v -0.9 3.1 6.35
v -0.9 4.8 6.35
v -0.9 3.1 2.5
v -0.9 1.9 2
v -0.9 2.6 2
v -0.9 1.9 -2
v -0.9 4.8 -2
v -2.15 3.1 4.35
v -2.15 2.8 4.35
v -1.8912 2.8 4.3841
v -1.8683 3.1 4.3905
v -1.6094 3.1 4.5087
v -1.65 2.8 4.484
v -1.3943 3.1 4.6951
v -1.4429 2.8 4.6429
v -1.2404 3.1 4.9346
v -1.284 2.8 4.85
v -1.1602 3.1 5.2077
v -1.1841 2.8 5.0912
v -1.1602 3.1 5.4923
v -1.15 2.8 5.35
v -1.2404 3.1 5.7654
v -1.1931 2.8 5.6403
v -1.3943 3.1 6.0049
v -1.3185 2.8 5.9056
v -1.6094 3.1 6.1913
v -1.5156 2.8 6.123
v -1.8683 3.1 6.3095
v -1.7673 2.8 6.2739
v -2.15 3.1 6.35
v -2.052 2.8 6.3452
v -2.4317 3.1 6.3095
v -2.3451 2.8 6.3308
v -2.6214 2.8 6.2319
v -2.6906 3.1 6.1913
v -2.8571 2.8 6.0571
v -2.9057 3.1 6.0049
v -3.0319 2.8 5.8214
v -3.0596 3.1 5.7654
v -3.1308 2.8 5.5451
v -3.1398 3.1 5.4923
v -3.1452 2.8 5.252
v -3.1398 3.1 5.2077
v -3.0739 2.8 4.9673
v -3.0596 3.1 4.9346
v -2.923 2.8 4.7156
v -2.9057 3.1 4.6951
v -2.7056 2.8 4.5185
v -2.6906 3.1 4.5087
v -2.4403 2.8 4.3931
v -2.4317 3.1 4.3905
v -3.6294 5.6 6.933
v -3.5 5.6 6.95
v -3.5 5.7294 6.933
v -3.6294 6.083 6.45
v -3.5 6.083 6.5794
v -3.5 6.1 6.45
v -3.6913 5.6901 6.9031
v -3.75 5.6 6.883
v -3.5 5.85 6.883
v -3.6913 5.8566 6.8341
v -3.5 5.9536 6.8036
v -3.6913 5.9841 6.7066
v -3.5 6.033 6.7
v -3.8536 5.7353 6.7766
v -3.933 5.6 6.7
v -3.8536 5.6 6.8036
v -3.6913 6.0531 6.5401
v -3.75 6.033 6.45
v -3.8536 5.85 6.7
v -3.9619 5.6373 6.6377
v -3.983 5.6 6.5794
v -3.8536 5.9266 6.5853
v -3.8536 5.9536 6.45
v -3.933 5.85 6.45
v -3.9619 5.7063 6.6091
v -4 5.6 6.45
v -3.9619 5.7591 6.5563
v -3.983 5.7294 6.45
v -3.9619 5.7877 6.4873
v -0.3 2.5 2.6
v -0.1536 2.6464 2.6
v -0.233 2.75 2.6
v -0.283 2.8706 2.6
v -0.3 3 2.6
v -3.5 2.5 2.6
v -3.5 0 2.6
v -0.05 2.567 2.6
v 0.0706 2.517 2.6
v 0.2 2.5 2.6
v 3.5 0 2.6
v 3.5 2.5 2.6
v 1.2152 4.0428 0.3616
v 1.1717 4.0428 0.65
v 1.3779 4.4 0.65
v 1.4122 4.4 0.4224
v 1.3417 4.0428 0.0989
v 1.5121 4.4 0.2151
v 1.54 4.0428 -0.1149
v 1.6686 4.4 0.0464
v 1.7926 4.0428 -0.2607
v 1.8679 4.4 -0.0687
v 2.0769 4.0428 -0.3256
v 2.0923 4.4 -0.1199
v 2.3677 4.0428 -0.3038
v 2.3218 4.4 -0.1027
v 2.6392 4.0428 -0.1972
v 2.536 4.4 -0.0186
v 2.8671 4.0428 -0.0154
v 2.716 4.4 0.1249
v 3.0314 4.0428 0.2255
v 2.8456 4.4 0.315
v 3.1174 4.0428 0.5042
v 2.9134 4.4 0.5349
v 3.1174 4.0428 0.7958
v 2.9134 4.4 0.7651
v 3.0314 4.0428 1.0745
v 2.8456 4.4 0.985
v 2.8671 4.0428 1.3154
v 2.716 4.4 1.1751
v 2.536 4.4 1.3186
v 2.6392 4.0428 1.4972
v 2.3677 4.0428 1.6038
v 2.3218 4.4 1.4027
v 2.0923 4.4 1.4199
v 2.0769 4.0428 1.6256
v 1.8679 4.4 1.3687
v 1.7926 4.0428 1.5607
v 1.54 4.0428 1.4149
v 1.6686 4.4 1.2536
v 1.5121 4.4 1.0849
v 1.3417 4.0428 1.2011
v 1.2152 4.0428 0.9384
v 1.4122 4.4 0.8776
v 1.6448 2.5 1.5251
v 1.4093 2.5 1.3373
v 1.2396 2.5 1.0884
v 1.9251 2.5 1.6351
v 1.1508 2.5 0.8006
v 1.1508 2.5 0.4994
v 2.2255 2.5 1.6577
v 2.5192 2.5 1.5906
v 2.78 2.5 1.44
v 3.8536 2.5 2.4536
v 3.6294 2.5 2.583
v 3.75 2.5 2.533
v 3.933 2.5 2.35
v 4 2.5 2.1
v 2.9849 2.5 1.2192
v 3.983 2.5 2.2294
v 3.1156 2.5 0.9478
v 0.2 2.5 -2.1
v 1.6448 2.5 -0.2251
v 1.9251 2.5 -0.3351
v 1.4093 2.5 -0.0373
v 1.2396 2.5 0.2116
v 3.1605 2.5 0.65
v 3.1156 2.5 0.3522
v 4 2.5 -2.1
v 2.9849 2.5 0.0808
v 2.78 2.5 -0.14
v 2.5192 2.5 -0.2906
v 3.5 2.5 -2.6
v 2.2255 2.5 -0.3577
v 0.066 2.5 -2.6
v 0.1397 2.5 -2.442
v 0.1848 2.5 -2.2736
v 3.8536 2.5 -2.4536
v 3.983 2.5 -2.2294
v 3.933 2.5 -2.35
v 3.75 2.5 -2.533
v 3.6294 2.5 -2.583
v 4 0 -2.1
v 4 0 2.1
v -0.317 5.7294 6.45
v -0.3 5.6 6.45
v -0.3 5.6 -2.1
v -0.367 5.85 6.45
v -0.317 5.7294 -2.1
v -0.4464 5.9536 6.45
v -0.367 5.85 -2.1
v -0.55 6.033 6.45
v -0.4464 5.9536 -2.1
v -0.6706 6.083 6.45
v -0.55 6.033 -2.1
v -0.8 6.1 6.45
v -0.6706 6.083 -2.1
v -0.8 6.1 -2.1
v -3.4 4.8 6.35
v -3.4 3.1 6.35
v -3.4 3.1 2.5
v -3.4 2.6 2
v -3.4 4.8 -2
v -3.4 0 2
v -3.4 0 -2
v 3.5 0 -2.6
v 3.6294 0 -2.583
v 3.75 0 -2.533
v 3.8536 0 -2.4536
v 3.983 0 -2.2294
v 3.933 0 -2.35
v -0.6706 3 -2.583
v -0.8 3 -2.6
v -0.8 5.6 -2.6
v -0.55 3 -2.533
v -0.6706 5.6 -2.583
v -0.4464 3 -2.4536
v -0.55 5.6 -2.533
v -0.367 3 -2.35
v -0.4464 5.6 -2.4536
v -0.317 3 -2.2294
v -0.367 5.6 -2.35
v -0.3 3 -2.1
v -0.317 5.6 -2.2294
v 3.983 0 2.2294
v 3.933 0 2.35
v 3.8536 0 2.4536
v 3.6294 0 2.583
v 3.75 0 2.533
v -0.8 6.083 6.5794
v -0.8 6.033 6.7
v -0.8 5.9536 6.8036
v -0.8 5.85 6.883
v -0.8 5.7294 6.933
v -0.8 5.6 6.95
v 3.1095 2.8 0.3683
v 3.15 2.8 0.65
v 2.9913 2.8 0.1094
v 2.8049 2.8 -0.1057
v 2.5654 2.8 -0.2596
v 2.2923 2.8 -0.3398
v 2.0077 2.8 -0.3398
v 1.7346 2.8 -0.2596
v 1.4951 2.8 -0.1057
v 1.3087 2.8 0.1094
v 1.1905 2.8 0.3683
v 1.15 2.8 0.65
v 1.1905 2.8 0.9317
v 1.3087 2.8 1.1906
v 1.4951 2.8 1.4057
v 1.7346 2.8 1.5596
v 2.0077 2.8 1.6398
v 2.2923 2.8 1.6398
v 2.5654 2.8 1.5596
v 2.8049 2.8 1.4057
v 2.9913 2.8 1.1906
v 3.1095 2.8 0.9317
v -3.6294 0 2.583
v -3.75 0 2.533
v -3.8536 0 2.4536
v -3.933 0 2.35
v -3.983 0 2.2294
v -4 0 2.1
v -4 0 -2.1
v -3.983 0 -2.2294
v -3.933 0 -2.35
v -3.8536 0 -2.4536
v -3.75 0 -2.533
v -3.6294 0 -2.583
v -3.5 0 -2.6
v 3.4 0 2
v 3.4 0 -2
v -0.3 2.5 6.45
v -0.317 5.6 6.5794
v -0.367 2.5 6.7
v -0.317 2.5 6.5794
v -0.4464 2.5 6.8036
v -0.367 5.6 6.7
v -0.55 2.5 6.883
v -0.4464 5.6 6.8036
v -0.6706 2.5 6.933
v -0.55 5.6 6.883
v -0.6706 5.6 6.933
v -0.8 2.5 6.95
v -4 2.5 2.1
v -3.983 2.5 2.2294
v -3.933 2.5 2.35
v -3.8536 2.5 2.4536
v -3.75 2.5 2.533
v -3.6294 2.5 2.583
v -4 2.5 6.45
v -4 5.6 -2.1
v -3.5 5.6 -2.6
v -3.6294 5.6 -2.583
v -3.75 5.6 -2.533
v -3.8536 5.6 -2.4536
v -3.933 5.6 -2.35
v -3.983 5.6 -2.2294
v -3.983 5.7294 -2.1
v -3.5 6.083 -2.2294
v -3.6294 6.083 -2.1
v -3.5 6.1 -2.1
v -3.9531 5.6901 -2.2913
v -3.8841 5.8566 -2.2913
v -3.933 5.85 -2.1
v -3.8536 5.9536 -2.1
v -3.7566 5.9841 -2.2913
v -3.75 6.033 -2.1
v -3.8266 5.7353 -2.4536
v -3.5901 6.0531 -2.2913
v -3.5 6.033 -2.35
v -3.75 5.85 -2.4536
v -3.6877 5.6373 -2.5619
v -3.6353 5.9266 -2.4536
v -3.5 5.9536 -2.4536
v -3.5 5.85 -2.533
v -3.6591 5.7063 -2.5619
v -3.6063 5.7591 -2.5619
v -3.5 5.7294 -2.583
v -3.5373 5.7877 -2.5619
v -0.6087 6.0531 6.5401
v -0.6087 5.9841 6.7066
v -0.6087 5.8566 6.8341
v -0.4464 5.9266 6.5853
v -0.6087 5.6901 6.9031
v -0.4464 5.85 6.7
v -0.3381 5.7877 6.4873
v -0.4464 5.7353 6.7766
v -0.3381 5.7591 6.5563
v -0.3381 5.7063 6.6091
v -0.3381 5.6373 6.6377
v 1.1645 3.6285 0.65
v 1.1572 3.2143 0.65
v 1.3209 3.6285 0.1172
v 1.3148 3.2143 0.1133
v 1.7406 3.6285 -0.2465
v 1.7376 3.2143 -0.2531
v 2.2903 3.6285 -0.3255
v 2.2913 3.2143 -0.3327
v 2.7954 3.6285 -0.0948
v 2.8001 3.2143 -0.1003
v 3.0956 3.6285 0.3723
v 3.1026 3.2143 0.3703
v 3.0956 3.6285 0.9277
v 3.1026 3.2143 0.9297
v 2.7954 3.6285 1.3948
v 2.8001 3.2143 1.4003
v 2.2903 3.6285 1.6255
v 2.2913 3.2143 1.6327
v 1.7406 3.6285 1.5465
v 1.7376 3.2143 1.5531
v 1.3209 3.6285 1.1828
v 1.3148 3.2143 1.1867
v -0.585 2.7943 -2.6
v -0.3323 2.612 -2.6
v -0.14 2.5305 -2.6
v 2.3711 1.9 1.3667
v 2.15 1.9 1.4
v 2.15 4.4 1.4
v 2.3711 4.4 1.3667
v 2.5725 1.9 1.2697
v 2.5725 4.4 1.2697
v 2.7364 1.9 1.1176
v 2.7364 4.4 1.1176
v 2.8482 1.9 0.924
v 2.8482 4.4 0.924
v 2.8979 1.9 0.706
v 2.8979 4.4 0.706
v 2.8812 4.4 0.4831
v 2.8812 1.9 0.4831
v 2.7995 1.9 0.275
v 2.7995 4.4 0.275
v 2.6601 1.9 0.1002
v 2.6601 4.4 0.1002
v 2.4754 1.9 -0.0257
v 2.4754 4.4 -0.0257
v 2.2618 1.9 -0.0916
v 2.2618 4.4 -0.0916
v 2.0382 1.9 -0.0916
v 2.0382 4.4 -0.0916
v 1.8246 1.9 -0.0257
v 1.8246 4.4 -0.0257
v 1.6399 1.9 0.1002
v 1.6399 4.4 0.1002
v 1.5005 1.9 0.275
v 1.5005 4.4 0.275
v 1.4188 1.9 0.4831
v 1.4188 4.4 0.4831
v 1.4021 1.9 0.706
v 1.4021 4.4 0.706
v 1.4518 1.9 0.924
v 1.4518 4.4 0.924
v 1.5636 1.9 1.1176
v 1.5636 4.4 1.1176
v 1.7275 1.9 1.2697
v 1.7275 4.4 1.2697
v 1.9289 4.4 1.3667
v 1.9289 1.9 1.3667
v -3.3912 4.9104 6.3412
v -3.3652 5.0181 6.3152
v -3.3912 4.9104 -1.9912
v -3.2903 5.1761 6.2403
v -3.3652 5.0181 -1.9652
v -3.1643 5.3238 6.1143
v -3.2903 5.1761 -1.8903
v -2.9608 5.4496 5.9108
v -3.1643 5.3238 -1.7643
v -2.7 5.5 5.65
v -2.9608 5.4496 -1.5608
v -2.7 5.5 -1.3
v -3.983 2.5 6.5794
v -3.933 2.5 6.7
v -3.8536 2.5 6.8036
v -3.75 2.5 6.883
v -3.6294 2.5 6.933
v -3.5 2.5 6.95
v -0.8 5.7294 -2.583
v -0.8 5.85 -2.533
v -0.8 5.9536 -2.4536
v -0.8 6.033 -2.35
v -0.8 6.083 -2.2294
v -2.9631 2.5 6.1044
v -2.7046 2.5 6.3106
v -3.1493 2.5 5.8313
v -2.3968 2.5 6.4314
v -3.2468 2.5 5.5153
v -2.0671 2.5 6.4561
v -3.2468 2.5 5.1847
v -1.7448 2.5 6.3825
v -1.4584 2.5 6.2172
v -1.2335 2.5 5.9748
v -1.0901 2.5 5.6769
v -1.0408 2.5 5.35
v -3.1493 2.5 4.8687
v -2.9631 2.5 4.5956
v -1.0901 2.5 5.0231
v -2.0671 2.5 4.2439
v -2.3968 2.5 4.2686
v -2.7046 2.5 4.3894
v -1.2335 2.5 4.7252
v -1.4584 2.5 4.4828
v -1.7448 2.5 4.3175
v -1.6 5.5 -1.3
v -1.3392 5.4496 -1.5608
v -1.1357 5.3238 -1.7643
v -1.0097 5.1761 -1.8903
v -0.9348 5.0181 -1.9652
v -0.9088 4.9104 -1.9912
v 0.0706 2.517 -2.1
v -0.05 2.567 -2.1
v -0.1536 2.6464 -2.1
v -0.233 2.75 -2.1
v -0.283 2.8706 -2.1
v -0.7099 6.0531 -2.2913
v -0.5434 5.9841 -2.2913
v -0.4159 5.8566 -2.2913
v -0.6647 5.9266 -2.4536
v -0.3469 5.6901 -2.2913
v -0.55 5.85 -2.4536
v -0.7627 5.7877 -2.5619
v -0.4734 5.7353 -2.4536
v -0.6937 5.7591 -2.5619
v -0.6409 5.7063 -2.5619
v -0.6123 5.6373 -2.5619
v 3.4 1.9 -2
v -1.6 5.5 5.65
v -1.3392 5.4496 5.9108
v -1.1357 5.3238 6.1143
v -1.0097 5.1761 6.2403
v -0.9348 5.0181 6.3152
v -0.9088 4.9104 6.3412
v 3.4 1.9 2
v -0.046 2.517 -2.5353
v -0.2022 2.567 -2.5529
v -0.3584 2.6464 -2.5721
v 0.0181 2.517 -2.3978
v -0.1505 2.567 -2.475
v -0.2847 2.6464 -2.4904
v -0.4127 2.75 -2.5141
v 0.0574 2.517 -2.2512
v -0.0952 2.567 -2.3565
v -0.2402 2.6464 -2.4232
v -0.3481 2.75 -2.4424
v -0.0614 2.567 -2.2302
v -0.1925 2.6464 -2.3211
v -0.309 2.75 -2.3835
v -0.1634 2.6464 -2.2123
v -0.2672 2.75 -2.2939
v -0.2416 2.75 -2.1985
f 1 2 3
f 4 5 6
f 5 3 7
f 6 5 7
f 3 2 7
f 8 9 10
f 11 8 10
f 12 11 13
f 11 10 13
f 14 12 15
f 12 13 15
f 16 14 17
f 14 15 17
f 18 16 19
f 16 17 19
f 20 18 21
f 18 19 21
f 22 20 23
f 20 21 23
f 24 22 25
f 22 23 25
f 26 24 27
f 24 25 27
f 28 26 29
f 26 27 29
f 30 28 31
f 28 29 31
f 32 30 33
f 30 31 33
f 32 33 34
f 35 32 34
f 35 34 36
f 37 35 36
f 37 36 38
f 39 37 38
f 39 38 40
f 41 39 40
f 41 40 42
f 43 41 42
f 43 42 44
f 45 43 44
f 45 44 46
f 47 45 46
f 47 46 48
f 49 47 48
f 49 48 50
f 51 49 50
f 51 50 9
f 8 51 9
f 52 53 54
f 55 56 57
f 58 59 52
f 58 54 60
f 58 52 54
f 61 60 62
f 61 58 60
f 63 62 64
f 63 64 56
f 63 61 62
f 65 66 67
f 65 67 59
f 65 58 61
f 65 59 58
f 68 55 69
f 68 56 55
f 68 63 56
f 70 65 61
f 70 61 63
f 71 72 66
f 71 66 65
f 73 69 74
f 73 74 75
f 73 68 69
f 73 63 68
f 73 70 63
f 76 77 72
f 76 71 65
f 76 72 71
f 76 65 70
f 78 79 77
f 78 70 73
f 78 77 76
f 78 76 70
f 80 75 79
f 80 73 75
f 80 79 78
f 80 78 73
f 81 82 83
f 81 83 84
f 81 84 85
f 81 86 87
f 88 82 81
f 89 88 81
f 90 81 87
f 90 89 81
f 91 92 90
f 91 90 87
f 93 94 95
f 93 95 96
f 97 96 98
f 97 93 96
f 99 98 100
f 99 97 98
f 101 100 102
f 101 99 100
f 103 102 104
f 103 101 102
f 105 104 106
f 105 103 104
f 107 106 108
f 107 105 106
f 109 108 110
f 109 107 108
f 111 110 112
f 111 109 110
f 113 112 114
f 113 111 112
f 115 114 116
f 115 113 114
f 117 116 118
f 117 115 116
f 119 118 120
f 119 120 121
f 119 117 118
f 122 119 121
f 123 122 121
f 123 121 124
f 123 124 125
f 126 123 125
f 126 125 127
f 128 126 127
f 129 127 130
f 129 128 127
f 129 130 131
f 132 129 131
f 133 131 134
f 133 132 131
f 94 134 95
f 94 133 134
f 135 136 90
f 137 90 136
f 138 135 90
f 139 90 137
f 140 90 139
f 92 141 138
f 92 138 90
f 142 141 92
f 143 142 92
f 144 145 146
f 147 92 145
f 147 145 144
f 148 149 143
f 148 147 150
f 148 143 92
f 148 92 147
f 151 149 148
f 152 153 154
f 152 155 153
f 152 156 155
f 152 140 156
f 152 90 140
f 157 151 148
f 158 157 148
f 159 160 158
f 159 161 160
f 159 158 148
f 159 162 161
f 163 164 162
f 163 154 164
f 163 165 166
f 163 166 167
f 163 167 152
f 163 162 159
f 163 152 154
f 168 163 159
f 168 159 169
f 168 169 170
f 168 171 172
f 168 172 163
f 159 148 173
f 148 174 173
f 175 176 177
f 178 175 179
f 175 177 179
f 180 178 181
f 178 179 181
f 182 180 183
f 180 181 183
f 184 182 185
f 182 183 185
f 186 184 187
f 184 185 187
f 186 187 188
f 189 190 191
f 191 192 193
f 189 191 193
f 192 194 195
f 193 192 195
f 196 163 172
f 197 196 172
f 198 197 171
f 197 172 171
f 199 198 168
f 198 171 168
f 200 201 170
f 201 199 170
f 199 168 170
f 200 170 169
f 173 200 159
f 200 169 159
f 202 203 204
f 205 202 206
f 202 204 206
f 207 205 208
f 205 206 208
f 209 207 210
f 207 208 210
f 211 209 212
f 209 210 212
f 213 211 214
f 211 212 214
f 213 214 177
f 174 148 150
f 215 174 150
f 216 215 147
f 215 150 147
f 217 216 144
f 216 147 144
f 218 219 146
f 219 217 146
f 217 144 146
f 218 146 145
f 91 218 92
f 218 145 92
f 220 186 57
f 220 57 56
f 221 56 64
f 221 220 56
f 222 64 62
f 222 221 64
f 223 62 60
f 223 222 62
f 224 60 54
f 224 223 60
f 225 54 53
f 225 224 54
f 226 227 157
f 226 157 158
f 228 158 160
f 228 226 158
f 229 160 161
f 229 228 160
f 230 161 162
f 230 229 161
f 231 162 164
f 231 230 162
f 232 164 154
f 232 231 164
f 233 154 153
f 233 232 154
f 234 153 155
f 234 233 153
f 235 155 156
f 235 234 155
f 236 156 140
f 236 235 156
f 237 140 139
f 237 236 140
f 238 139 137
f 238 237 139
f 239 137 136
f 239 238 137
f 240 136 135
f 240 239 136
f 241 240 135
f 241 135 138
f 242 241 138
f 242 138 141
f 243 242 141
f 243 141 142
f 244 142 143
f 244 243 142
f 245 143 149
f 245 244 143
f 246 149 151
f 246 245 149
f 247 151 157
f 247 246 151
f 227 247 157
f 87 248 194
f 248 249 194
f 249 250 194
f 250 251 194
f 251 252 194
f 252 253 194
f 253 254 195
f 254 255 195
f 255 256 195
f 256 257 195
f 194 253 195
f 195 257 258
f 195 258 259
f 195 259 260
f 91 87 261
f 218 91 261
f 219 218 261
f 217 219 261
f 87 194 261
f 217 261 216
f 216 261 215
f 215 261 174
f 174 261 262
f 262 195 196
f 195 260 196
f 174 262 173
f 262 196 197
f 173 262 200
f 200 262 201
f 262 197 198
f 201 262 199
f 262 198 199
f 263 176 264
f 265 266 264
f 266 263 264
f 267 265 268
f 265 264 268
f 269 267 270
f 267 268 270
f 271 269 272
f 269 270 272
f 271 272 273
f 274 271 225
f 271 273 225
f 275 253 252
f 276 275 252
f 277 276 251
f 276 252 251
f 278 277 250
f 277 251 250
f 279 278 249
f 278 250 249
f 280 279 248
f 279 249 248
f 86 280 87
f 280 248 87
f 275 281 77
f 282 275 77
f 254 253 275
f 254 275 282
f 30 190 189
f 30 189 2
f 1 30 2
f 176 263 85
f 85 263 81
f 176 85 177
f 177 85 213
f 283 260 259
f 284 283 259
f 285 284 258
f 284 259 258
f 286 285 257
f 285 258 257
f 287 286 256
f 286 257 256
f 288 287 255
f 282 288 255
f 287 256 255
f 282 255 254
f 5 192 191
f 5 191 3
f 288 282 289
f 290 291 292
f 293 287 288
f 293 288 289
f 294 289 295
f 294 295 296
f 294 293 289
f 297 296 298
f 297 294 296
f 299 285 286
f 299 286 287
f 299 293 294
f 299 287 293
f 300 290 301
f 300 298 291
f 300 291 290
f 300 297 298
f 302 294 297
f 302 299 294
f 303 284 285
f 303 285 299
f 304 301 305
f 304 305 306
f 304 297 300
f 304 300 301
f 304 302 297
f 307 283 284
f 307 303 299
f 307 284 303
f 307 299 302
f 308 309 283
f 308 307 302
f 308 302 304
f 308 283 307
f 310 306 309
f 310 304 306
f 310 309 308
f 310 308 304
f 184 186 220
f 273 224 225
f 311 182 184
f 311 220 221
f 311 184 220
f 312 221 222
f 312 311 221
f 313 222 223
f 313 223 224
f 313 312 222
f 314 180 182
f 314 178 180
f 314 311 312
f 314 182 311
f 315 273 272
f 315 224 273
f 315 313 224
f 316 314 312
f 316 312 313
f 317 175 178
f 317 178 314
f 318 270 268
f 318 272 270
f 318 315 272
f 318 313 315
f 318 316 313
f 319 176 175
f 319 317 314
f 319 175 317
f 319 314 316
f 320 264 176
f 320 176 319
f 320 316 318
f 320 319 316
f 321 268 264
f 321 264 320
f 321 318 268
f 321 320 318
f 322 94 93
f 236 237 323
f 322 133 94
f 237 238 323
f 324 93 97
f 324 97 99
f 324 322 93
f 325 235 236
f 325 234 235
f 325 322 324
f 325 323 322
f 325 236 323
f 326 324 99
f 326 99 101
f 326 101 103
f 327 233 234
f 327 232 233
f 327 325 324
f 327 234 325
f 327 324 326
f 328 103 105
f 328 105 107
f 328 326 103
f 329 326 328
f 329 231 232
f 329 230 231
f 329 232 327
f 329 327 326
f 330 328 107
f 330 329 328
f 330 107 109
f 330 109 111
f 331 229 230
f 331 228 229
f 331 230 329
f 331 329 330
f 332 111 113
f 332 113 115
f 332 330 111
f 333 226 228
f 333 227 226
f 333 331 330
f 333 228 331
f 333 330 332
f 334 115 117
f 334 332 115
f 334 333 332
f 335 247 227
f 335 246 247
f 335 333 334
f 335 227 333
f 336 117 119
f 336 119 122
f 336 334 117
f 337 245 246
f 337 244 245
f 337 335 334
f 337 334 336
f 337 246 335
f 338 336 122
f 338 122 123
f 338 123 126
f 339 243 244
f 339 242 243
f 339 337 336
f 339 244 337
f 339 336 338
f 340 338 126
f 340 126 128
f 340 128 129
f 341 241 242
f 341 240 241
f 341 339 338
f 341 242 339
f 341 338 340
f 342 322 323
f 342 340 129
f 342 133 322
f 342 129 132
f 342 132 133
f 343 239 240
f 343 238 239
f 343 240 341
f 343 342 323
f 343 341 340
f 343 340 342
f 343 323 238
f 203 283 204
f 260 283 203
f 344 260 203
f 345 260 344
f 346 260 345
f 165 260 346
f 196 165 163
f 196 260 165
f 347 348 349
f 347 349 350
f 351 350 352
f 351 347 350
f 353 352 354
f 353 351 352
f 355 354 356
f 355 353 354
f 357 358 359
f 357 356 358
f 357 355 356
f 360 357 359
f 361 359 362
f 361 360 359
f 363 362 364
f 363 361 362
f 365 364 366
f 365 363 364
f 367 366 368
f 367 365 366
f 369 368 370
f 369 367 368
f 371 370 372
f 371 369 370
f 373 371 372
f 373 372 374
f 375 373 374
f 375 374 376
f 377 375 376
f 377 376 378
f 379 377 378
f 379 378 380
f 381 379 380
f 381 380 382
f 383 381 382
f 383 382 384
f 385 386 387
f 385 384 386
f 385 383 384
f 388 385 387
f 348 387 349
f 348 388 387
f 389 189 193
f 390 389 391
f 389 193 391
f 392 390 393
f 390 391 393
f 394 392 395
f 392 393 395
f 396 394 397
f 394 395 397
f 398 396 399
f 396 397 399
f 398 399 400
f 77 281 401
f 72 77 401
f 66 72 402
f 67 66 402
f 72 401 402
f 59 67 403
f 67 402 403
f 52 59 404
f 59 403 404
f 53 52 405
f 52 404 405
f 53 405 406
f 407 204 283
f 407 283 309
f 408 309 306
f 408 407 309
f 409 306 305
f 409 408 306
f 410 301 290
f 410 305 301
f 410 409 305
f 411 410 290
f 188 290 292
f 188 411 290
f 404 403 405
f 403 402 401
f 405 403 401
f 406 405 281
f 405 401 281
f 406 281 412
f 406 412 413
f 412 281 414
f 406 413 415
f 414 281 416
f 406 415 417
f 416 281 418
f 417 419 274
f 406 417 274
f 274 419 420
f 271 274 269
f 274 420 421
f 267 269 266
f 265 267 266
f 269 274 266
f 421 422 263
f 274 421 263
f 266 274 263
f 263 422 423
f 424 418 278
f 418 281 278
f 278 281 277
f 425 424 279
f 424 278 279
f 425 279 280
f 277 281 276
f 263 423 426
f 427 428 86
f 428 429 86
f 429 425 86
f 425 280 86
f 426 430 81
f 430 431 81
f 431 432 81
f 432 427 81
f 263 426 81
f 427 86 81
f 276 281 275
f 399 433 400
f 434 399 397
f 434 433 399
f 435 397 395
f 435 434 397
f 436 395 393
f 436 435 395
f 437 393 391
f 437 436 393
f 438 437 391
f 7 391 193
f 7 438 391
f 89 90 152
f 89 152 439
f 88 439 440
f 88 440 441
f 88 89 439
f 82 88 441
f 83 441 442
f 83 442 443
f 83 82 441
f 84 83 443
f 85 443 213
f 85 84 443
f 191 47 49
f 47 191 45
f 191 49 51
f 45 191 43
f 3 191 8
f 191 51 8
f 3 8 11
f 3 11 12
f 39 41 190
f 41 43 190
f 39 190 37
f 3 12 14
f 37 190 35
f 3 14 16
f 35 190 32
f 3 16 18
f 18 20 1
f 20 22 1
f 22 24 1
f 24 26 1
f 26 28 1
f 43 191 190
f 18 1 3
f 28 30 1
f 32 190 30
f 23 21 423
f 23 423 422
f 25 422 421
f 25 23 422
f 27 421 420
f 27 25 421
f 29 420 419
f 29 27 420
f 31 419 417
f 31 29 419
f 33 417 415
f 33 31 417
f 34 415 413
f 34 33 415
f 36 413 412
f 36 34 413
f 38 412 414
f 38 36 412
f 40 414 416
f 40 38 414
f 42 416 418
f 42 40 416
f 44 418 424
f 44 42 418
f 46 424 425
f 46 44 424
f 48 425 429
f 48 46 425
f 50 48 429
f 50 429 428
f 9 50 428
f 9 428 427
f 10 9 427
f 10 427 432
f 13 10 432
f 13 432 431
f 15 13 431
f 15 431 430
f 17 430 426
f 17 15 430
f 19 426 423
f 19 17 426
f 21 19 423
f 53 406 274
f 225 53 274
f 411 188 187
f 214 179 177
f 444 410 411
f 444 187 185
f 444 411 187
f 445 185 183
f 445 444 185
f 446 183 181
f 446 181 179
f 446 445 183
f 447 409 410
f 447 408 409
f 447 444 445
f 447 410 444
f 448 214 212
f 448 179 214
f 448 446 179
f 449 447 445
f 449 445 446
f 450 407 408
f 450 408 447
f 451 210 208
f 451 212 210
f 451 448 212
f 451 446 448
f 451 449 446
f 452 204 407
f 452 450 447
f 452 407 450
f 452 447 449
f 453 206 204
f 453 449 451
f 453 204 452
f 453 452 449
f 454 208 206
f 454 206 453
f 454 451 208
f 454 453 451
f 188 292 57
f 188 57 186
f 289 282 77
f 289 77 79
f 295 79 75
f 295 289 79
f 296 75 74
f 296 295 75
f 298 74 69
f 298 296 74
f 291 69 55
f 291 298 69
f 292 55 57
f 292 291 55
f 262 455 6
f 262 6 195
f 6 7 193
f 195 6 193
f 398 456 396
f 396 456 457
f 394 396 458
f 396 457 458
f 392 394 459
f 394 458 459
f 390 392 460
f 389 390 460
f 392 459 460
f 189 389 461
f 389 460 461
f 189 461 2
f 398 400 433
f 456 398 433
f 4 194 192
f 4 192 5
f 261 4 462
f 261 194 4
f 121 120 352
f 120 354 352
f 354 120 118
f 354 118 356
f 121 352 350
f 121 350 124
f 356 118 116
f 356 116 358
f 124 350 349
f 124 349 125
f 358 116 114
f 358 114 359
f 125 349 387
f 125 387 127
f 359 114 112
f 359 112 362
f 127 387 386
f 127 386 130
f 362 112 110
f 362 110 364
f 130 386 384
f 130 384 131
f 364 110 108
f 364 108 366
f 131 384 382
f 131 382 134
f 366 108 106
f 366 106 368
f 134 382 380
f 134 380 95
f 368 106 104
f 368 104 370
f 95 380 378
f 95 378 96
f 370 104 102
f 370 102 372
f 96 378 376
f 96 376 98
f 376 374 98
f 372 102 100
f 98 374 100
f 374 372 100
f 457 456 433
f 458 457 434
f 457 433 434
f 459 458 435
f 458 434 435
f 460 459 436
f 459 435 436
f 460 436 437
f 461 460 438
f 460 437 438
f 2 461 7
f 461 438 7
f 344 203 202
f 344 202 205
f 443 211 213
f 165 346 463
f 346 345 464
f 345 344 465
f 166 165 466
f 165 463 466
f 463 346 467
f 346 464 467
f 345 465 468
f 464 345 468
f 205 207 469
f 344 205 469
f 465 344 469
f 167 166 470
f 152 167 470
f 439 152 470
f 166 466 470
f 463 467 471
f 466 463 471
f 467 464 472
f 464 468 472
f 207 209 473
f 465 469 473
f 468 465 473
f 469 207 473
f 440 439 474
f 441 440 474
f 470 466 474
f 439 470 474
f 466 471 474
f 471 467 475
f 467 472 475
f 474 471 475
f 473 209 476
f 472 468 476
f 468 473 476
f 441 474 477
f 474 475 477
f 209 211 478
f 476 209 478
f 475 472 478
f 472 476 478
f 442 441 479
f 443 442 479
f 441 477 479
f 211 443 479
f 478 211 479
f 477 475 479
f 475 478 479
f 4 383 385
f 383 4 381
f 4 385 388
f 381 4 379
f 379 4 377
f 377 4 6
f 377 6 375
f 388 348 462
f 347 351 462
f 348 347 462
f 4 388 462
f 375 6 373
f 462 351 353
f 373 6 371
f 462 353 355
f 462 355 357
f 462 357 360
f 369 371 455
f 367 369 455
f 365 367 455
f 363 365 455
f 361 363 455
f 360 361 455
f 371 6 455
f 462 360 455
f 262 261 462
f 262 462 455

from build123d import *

# Parameters (mm, degrees)
SKETCH1_W               = 8
SKETCH1_H               = 5.2
SKETCH1_W_2             = 6.8
SKETCH1_H_2             = 4
BOSS_EXTRUDE1_DEPTH     = 2.5
SKETCH3_W               = 3.7
SKETCH3_H               = 9.55
SKETCH3_W_2             = 2.5
SKETCH3_H_2             = 8.35
BOSS_EXTRUDE2_DEPTH     = 3
SKETCH4_W               = 3.7
SKETCH4_H               = 4.95
BOSS_EXTRUDE3_DEPTH     = 0.6
SKETCH5_W               = 3.7
SKETCH5_H               = 9.55
BOSS_EXTRUDE4_DEPTH     = 0.6
SKETCH6_W               = 4.9
SKETCH6_H               = 5.2
BOSS_EXTRUDE5_DEPTH     = 0.6
FILLET2_R               = 0.7
SKETCH7_R               = 1
CUT_EXTRUDE1_DEPTH      = 4.5
CUT_EXTRUDE1_DRAFT      = -20
CUT_EXTRUDE3_REACH      = 10.671
SKETCH7_2_R             = 1
BOSS_EXTRUDE6_START     = -0.3
SKETCH8_R               = 1
BOSS_EXTRUDE6_DEPTH     = 1.6
BOSS_EXTRUDE6_DRAFT     = -1
CUT_EXTRUDE2_DEPTH      = 10.146720724
CUT_EXTRUDE2_DEPTH_BACK = 10.146720724
SKETCH9_R               = 0.75
FILLET3_R               = 0.5
FILLET5_R               = 0.5
FILLET6_R               = 0.5
CHAMFER1_SIZE           = 0.5
CHAMFER2_SIZE           = 0.2
CHAMFER2_SIZE2          = 0.357264117


# Read off the part's stored shape, not the designer's step: Boss-Extrude7
with BuildPart() as part:
    # Sketch1 → Boss-Extrude1 (new body)
    with BuildSketch(Plane(origin=(0, 0, 0), x_dir=(1, 0, 0), z_dir=(0, 1, 0))):
        Rectangle(SKETCH1_W, SKETCH1_H)
        Rectangle(SKETCH1_W_2, SKETCH1_H_2, mode=Mode.SUBTRACT)
    extrude(amount=BOSS_EXTRUDE1_DEPTH)

    # Sketch3 → Boss-Extrude2 (add)
    with BuildSketch(Plane(origin=(0, 2.5, 0), x_dir=(1, 0, 0), z_dir=(0, 1, 0))):
        with Locations((-2.15, -2.175)):
            Rectangle(SKETCH3_W, SKETCH3_H)
        with Locations((-2.15, -2.175)):
            Rectangle(SKETCH3_W_2, SKETCH3_H_2, mode=Mode.SUBTRACT)
    extrude(amount=BOSS_EXTRUDE2_DEPTH)

    # Sketch4 → Boss-Extrude3 (add)
    with BuildSketch(Plane.XZ.offset(-2.5)):
        with Locations((-2.15, 4.475)):
            Rectangle(SKETCH4_W, SKETCH4_H)
    extrude(amount=-BOSS_EXTRUDE3_DEPTH)

    # Sketch5 → Boss-Extrude4 (add)
    with BuildSketch(Plane(origin=(0, 5.5, 0), x_dir=(1, 0, 0), z_dir=(0, 1, 0))):
        with Locations((-2.15, -2.175)):
            Rectangle(SKETCH5_W, SKETCH5_H)
    extrude(amount=BOSS_EXTRUDE4_DEPTH)

    # Sketch6 → Boss-Extrude5 (add)
    with BuildSketch(Plane(origin=(0, 2.5, 0), x_dir=(1, 0, 0), z_dir=(0, 1, 0))):
        with Locations((1.55, 0)):
            Rectangle(SKETCH6_W, SKETCH6_H)
    extrude(amount=-BOSS_EXTRUDE5_DEPTH)

    # Fillet2
    fillet2_edges = [part.edges().sort_by_distance(p)[0] for p in [
        (-2.15, 5.5, -2),
        (-0.9, 5.5, 2.175),
        (-2.15, 5.5, 6.35),
        (-3.4, 5.5, 2.175),
    ]]
    fillet(fillet2_edges, radius=FILLET2_R)


with BuildPart() as cut_extrude1_tool:
    # Sketch7 → Cut-Extrude1 (with draft: the straight prism first)
    with BuildSketch(Plane.XZ.offset(-2.8)):
        with Locations((-2.15, 5.35)):
            Circle(SKETCH7_R)
    extrude(amount=CUT_EXTRUDE1_DEPTH)
    # Cut-Extrude1: the draft: its side faces are tilted about the plane it starts from
    cut_extrude1_sides = [cut_extrude1_tool.faces().sort_by_distance(p)[0] for p in [
        (-3.15, 0.55, 5.35),
    ]]
    draft(cut_extrude1_sides, Plane.XZ.offset(-2.8), CUT_EXTRUDE1_DRAFT)


with BuildPart() as part_1:
    add(part.part)

    # Cut-Extrude1: cut by cut_extrude1_tool
    add(cut_extrude1_tool.part, mode=Mode.SUBTRACT)

    # Sketch7<2> → Cut-Extrude3 (cut, up to next)
    with BuildSketch(Plane.XZ.offset(-2.8), mode=Mode.PRIVATE) as cut_extrude3_sk1:
        with Locations(Location((-2.15, 5.35, 0), (0, 0, 270))):
            Circle(SKETCH7_2_R)
    cut_extrude3_tool1 = extrude(cut_extrude3_sk1.sketch, amount=-CUT_EXTRUDE3_REACH, mode=Mode.PRIVATE) & part_1.part
    add(cut_extrude3_tool1.solids().sort_by_distance((-2.15, 2.8, 5.35))[0], mode=Mode.SUBTRACT)



with BuildPart() as body_2:
    # Sketch8 → Boss-Extrude6 (with draft: the straight prism first)
    with BuildSketch(Plane(origin=(0, 2.5, 0), x_dir=(-1, 0, 0), z_dir=(0, -1, 0)).offset(BOSS_EXTRUDE6_START)):
        with Locations((-2.15, -0.65)):
            Circle(SKETCH8_R)
    extrude(amount=-BOSS_EXTRUDE6_DEPTH)
    # Boss-Extrude6: the draft: its side faces are tilted about the plane it starts from
    boss_extrude6_sides = [body_2.faces().sort_by_distance(p)[0] for p in [
        (3.15, 3.6, 0.65),
    ]]
    draft(boss_extrude6_sides, Plane(origin=(0, 2.5, 0), x_dir=(-1, 0, 0), z_dir=(0, -1, 0)).offset(BOSS_EXTRUDE6_START), BOSS_EXTRUDE6_DRAFT)


with BuildPart() as part_2:
    add(part_1.part)

    add(body_2.part)  # Boss-Extrude7 merges body 2
    # Boss-Extrude7 outline → Boss-Extrude7 (revolve)
    with BuildSketch(Plane(origin=(2.15, 0, 0.65), x_dir=(1, 0, 0), z_dir=(0, 0, 1))):
        Polygon((1.010476231, 2.5), (1, 2.8), (0, 2.8), (0, 2.5), align=None)
    revolve(axis=Axis((2.15, 0, 0.65), (0, 1, 0)))

    # Sketch9 → Cut-Extrude2 (cut, two sides: drawn at the far end of the back side and taken through both)
    with BuildSketch(Plane(origin=(0, 4.4, 0), x_dir=(1, 0, 0), z_dir=(0, 1, 0)).offset(-CUT_EXTRUDE2_DEPTH_BACK)):
        with Locations(Location((2.15, -0.65, 0), (0, 0, 270))):
            Circle(SKETCH9_R)
    extrude(amount=CUT_EXTRUDE2_DEPTH + CUT_EXTRUDE2_DEPTH_BACK, mode=Mode.SUBTRACT)

    # Fillet3
    fillet3_edges = [part_2.edges().sort_by_distance(p)[0] for p in [
        (-4, 6.1, 2.175),
        (-2.15, 6.1, 6.95),
        (-0.3, 6.1, 2.175),
        (-2.15, 6.1, -2.6),
    ]]
    fillet(fillet3_edges, radius=FILLET3_R)

    # Fillet5
    # the kernel refuses this fillet: 0.5 mm, written as the material it takes off along each edge
    with BuildSketch(Plane(origin=(-0.8, 5.6, -2.1), x_dir=(1, 0, 0), z_dir=(0, 0, -1))) as fillet5_piece_1_section:
        Polygon((0, 0), (FILLET5_R, 0), (FILLET5_R, -FILLET5_R), (0, -FILLET5_R), align=None)
    fillet5_piece_1 = extrude(amount=FILLET5_R, mode=Mode.PRIVATE)
    fillet5_piece_1 = fillet5_piece_1 - Plane(origin=(-0.8, 5.6, -2.1), x_dir=(-0.7071067811865475, -0.7071067811865475, 0), z_dir=(0, 0, -1)) * Sphere(FILLET5_R, mode=Mode.PRIVATE)
    add(fillet5_piece_1, mode=Mode.SUBTRACT)
    with BuildSketch(Plane(origin=(-0.8, 5.6, 6.45), x_dir=(0, 0, 1), z_dir=(1, 0, 0))) as fillet5_piece_2_section:
        Polygon((0, 0), (FILLET5_R, 0), (FILLET5_R, -FILLET5_R), (0, -FILLET5_R), align=None)
    fillet5_piece_2 = extrude(amount=FILLET5_R, mode=Mode.PRIVATE)
    fillet5_piece_2 = fillet5_piece_2 - Plane(origin=(-0.8, 5.6, 6.45), x_dir=(0, -0.7071067811865475, -0.7071067811865475), z_dir=(1, 0, 0)) * Sphere(FILLET5_R, mode=Mode.PRIVATE)
    add(fillet5_piece_2, mode=Mode.SUBTRACT)
    with BuildSketch(Plane(origin=(-3.5, 5.6, -2.1), x_dir=(-1, 0, 0), z_dir=(0, 0, -1))) as fillet5_piece_3_section:
        Polygon((0, 0), (FILLET5_R, 0), (FILLET5_R, FILLET5_R), (0, FILLET5_R), align=None)
    fillet5_piece_3 = extrude(amount=FILLET5_R, mode=Mode.PRIVATE)
    fillet5_piece_3 = fillet5_piece_3 - Plane(origin=(-3.5, 5.6, -2.1), x_dir=(0.7071067811865475, -0.7071067811865475, 0), z_dir=(0, 0, -1)) * Sphere(FILLET5_R, mode=Mode.PRIVATE)
    add(fillet5_piece_3, mode=Mode.SUBTRACT)
    with BuildSketch(Plane(origin=(-3.5, 5.6, 6.45), x_dir=(0, 0, 1), z_dir=(-1, 0, 0))) as fillet5_piece_4_section:
        Polygon((0, 0), (FILLET5_R, 0), (FILLET5_R, FILLET5_R), (0, FILLET5_R), align=None)
    fillet5_piece_4 = extrude(amount=FILLET5_R, mode=Mode.PRIVATE)
    fillet5_piece_4 = fillet5_piece_4 - Plane(origin=(-3.5, 5.6, 6.45), x_dir=(0, -0.7071067811865475, -0.7071067811865475), z_dir=(-1, 0, 0)) * Sphere(FILLET5_R, mode=Mode.PRIVATE)
    add(fillet5_piece_4, mode=Mode.SUBTRACT)
    with BuildSketch(Plane(origin=(4, 3.75, 2.6), x_dir=(0, 0, -1), z_dir=(0, -1, 0)), Plane(origin=(4, 3.75, -2.6), x_dir=(-1, 0, 0), z_dir=(0, -1, 0))) as fillet5_piece_5:
        with BuildLine():
            CenterArc((FILLET5_R, -FILLET5_R), FILLET5_R, 90, 90)
            Line((0, -FILLET5_R), (0, 0))
            Line((0, 0), (FILLET5_R, 0))
        make_face()
    extrude(amount=5, mode=Mode.SUBTRACT)
    with BuildSketch(Plane(origin=(-4, 1.25, 6.95), x_dir=(0, 0, -1), z_dir=(0, 1, 0)), Plane(origin=(-0.3, 5.6, 6.95), x_dir=(0, 0, -1), z_dir=(0, -1, 0))) as fillet5_piece_6:
        with BuildLine():
            CenterArc((FILLET5_R, -FILLET5_R), FILLET5_R, 90, 90)
            Line((0, -FILLET5_R), (0, 0))
            Line((0, 0), (FILLET5_R, 0))
        make_face()
    extrude(amount=4.35, mode=Mode.SUBTRACT)
    with BuildSketch(Plane(origin=(-4, -1.25, -2.6), x_dir=(1, 0, 0), z_dir=(0, 1, 0))) as fillet5_piece_7:
        with BuildLine():
            CenterArc((FILLET5_R, -FILLET5_R), FILLET5_R, 90, 90)
            Line((0, -FILLET5_R), (0, 0))
            Line((0, 0), (FILLET5_R, 0))
        make_face()
    extrude(amount=6.85, mode=Mode.SUBTRACT)
    with BuildSketch(Plane(origin=(-0.3, 5.6, -2.6), x_dir=(-1, 0, 0), z_dir=(0, -1, 0))) as fillet5_piece_8:
        with BuildLine():
            CenterArc((FILLET5_R, -FILLET5_R), FILLET5_R, 90, 90)
            Line((0, -FILLET5_R), (0, 0))
            Line((0, 0), (FILLET5_R, 0))
        make_face()
    extrude(amount=3.1, mode=Mode.SUBTRACT)
    with BuildSketch(Plane(origin=(-4, -1.25, 2.6), x_dir=(0, 0, -1), z_dir=(0, 1, 0))) as fillet5_piece_9:
        with BuildLine():
            CenterArc((FILLET5_R, -FILLET5_R), FILLET5_R, 90, 90)
            Line((0, -FILLET5_R), (0, 0))
            Line((0, 0), (FILLET5_R, 0))
        make_face()
    extrude(amount=3.75, mode=Mode.SUBTRACT)

    # Fillet6
    # the kernel refuses this fillet: 0.5 mm, written as the material it adds along each edge
    with BuildSketch(Plane(origin=(-0.3, 2.5, 2.6), x_dir=(0, 1, 0), z_dir=(0, 0, -1))) as fillet6_piece_1:
        with BuildLine():
            CenterArc((FILLET6_R, FILLET6_R), FILLET6_R, 180, 90)
            Line((0, FILLET6_R), (0, 0))
            Line((0, 0), (FILLET6_R, 0))
        make_face()
    extrude(amount=4.7)
    with BuildSketch(Plane(origin=(-0.8, 2.5, -2.1), x_dir=(-0.5976672776328278, 0, 0.8017442392976482), z_dir=(0.8017442392976482, 0, 0.5976672776328278))) as fillet6_piece_2_section:
        with BuildLine():
            CenterArc((0.5 + FILLET6_R, -FILLET6_R), FILLET6_R, 90, 90)
            Line((0.5, -FILLET6_R), (0.5, 0))
            Line((0.5, 0), (0.5 + FILLET6_R, 0))
        make_face()
    fillet6_piece_2 = revolve(axis=Axis((-0.8, 2.5, -2.1), (0, -1, 0)), revolution_arc=233.296989237, mode=Mode.PRIVATE)
    fillet6_piece_2 = split(fillet6_piece_2, bisect_by=Plane(origin=(-0.425030478, 2.655814189, -2.6), z_dir=(0, 0, 1)), keep=Keep.TOP, mode=Mode.PRIVATE)
    fillet6_piece_2 = split(fillet6_piece_2, bisect_by=Plane(origin=(-0.425030478, 2.655814189, -2), z_dir=(0, 0, -1)), keep=Keep.TOP, mode=Mode.PRIVATE)
    add(fillet6_piece_2)

    # Chamfer1
    chamfer1_edges = [part_2.edges().sort_by_distance(p)[0] for p in [
        (-2.15, 3.1, 2),
    ]]
    chamfer(chamfer1_edges, length=CHAMFER1_SIZE)

    # Chamfer2
    chamfer2_edges = [part_2.edges().sort_by_distance(p)[0] for p in [
        (3.122071896, 4.4, 0.65),
    ]]
    chamfer2_side = [part_2.faces().sort_by_distance(p)[0] for p in [
        (3.094577551, 4.4, 0.65),
    ]]
    chamfer(chamfer2_edges, length=CHAMFER2_SIZE, length2=CHAMFER2_SIZE2, reference=chamfer2_side[0])


solid = part_2.part
